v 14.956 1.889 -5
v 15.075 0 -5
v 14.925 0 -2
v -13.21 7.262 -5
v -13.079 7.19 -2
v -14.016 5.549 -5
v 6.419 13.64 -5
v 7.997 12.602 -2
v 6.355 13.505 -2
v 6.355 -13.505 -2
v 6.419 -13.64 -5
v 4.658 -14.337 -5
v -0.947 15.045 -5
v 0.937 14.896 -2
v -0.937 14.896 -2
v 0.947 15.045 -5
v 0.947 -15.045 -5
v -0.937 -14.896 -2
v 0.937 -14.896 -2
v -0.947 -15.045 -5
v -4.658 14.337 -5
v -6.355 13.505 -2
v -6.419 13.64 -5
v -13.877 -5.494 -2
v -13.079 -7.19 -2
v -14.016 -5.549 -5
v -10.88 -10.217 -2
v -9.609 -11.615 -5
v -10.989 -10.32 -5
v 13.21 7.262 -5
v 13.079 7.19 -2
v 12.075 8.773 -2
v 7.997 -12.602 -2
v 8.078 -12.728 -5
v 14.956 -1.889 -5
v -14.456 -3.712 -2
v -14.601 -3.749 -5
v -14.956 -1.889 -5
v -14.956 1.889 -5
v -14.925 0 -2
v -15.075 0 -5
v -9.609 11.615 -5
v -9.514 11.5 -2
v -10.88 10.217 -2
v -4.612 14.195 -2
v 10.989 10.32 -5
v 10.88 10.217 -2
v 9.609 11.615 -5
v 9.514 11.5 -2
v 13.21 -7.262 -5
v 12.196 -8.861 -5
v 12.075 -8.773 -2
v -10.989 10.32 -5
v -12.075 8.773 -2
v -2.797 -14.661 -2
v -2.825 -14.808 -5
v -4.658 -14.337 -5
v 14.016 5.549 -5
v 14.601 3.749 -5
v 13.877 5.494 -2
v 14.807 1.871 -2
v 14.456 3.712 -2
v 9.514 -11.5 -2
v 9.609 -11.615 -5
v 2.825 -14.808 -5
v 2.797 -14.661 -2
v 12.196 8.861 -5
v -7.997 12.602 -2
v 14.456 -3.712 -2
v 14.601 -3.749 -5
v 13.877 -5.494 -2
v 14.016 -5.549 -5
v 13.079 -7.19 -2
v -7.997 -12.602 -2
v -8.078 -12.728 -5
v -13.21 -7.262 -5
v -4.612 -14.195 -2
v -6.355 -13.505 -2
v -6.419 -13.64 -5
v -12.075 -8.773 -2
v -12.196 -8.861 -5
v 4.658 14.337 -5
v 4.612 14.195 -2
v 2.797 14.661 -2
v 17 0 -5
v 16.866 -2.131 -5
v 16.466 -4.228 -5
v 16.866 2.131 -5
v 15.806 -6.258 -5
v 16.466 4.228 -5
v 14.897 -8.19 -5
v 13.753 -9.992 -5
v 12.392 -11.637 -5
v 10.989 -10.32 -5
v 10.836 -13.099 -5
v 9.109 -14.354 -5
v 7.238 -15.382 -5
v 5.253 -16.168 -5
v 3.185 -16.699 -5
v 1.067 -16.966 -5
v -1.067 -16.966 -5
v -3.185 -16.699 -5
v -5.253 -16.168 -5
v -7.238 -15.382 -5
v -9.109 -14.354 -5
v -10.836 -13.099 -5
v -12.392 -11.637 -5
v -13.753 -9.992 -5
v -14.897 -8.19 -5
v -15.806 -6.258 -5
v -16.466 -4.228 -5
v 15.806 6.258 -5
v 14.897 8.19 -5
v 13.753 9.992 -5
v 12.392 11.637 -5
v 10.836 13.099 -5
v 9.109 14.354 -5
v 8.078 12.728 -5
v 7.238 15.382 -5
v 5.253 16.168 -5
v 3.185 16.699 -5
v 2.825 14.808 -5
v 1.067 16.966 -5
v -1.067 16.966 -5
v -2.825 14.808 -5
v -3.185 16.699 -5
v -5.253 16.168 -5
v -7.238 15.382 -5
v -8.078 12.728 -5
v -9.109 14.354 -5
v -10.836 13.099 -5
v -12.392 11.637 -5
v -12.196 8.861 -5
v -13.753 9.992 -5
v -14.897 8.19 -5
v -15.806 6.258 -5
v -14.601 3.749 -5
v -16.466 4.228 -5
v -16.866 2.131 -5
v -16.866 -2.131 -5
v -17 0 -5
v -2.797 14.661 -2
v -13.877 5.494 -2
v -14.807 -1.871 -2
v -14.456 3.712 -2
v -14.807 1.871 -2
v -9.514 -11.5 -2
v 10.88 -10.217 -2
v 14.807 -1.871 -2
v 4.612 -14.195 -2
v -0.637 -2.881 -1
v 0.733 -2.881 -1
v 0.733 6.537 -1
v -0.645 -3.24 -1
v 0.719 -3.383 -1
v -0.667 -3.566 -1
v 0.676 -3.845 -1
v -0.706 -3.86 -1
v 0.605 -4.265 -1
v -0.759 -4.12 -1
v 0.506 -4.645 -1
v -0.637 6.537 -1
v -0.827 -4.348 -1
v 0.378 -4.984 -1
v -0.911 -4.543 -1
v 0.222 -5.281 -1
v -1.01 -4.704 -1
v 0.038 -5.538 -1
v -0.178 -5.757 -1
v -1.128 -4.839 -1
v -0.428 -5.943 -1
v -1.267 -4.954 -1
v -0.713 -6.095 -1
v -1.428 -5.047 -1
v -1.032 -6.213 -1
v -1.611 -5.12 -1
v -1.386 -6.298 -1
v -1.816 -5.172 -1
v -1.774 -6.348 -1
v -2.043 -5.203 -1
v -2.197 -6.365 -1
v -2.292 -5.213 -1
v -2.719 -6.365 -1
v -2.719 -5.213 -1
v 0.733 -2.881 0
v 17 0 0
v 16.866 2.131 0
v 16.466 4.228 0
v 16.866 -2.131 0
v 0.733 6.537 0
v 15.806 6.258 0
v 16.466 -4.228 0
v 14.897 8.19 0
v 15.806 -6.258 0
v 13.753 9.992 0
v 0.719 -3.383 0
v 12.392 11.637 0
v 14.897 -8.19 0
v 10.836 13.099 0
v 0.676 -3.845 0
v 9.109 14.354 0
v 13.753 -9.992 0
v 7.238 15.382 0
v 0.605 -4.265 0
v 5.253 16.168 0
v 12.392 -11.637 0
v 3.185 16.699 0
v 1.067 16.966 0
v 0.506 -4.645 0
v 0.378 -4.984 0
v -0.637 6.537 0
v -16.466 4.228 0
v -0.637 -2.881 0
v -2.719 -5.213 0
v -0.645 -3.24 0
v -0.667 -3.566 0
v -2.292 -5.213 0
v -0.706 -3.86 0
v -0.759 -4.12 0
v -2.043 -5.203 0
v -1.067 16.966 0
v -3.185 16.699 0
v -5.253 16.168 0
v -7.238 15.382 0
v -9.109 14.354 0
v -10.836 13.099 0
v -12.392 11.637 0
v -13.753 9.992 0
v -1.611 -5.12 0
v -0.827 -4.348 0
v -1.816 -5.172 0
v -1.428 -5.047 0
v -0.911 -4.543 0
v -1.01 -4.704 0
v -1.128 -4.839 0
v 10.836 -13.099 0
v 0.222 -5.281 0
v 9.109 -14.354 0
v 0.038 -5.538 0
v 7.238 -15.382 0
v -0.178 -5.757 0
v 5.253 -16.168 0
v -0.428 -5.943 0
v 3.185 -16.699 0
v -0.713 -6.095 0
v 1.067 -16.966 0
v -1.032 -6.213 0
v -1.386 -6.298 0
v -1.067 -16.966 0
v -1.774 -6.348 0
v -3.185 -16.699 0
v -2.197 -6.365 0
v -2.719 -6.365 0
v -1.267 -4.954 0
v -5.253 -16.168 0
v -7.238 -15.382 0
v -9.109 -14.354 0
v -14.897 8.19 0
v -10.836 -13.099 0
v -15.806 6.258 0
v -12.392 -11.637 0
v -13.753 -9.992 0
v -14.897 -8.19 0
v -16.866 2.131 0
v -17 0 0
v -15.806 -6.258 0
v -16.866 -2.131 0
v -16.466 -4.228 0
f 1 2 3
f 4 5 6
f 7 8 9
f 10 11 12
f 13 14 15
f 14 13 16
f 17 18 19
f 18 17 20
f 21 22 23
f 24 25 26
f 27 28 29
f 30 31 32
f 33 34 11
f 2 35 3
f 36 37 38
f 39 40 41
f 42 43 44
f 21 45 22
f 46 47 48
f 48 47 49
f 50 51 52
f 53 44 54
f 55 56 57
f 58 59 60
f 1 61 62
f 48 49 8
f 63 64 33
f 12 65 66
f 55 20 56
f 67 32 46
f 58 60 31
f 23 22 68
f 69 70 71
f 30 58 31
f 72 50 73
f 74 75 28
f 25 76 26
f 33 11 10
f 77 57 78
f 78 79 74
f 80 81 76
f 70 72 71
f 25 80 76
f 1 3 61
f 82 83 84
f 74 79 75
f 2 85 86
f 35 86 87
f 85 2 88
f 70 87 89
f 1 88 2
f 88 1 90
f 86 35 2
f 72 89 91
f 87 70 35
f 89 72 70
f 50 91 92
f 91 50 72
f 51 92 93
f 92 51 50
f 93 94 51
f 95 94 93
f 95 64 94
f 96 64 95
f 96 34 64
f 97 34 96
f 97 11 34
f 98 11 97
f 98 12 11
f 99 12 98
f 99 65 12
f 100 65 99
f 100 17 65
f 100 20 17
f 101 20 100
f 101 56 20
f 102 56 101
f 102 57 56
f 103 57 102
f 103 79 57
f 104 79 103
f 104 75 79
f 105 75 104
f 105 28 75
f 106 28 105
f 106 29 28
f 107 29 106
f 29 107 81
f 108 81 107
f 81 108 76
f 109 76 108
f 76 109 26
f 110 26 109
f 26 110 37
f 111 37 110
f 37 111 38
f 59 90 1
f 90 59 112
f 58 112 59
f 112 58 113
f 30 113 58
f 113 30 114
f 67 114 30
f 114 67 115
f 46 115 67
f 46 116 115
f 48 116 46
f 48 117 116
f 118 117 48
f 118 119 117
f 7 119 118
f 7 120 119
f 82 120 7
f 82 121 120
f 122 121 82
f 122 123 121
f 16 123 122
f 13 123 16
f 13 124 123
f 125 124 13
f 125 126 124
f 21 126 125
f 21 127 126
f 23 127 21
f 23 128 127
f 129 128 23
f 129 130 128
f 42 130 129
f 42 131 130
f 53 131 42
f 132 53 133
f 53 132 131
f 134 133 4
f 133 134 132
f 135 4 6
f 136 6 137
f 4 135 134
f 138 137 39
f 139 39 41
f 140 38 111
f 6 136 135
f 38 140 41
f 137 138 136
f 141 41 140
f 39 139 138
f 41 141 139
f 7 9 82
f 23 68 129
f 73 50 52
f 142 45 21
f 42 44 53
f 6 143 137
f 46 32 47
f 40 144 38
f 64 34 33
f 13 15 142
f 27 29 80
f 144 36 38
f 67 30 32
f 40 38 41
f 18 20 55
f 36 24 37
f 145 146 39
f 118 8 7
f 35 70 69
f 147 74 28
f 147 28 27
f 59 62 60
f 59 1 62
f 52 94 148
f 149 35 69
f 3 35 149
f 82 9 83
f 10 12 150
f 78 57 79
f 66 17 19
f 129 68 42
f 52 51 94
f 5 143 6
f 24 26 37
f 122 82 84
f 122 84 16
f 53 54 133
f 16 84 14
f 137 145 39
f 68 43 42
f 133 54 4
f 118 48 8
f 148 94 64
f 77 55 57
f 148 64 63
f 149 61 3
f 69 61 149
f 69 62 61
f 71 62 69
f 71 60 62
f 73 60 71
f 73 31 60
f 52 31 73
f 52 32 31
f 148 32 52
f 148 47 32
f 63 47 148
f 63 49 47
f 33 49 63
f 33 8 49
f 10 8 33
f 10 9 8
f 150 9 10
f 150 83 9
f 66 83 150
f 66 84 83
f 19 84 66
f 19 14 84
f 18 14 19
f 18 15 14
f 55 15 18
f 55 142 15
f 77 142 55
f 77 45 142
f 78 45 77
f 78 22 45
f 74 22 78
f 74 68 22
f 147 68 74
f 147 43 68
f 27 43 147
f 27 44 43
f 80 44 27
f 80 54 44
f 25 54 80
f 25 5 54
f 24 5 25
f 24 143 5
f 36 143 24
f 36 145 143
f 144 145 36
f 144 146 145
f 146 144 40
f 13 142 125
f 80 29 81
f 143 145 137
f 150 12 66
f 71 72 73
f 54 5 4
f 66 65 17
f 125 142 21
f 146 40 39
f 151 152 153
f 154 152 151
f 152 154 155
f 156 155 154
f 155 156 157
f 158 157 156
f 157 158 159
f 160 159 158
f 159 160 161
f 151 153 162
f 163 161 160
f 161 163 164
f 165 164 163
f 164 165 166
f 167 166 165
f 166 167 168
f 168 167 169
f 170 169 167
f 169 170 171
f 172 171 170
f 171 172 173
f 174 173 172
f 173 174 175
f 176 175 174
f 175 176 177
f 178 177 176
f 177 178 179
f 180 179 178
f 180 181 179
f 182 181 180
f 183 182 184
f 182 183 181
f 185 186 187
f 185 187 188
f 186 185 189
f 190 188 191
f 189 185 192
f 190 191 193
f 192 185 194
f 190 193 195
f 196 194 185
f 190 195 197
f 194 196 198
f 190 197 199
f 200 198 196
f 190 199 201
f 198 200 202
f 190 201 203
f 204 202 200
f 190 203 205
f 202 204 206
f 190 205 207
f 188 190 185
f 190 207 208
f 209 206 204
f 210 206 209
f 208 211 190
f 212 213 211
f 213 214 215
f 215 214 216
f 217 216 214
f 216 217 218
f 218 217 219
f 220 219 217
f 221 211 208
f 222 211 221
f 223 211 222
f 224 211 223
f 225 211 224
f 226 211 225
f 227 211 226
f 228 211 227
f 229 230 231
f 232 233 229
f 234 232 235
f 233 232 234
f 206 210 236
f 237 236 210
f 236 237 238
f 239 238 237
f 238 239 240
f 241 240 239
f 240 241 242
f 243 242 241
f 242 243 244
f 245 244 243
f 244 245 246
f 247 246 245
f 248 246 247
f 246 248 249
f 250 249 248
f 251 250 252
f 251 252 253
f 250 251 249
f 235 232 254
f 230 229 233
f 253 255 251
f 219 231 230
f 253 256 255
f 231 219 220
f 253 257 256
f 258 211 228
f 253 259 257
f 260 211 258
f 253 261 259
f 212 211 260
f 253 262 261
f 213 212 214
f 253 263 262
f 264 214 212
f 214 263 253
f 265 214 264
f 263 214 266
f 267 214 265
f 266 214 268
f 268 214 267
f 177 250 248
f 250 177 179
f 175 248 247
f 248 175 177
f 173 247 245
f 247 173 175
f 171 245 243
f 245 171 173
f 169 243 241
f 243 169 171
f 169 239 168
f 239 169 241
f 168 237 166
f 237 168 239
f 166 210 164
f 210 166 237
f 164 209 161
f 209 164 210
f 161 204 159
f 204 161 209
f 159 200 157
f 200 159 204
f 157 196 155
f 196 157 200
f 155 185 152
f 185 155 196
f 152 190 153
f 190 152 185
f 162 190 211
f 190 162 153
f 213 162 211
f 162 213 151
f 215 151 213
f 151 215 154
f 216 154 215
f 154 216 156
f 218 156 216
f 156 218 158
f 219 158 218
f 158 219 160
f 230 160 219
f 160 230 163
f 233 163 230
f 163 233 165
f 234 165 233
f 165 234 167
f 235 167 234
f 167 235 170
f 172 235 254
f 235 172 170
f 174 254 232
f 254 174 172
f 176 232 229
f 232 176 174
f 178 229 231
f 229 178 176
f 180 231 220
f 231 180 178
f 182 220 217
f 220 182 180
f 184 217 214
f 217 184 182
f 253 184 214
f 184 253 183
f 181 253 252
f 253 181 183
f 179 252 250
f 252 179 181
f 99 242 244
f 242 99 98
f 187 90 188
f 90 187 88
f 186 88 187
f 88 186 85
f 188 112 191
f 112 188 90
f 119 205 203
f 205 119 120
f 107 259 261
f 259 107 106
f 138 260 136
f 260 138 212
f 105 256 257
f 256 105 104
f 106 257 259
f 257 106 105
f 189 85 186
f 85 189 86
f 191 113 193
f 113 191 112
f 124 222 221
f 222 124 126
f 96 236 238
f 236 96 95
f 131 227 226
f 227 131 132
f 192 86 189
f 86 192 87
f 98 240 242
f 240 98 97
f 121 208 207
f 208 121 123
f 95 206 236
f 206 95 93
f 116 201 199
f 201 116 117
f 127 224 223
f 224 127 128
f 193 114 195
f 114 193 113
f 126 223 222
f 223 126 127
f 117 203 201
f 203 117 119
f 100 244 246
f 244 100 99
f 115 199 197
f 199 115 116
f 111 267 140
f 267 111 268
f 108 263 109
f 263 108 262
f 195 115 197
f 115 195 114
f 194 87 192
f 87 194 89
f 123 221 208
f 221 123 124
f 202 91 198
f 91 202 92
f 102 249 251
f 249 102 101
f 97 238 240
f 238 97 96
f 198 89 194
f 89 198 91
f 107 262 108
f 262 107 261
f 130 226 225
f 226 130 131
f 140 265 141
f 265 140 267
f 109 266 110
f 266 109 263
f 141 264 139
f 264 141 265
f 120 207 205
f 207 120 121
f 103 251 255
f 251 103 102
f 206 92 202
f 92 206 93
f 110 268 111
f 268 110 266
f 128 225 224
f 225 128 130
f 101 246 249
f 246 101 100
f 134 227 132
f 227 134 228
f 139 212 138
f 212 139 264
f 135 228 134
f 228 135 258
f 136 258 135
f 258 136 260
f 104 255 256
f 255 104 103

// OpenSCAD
$fn = 50;


difference() {
	union() {
		translate(v = [0, 0, -5.0000000000]) {
			cylinder(h = 5, r = 17.0000000000);
		}
	}
	union() {
		#translate(v = [0, 0, -5.0000000000]) {
			cylinder(h = 3, r1 = 15.0750000000, r2 = 14.9250000000);
		}
		translate(v = [0, 0, -1]) {
			linear_extrude(height = 1) {
				text(font = "Impact", halign = "center", size = 10, text = "J", valign = "center");
			}
		}
	}
}
